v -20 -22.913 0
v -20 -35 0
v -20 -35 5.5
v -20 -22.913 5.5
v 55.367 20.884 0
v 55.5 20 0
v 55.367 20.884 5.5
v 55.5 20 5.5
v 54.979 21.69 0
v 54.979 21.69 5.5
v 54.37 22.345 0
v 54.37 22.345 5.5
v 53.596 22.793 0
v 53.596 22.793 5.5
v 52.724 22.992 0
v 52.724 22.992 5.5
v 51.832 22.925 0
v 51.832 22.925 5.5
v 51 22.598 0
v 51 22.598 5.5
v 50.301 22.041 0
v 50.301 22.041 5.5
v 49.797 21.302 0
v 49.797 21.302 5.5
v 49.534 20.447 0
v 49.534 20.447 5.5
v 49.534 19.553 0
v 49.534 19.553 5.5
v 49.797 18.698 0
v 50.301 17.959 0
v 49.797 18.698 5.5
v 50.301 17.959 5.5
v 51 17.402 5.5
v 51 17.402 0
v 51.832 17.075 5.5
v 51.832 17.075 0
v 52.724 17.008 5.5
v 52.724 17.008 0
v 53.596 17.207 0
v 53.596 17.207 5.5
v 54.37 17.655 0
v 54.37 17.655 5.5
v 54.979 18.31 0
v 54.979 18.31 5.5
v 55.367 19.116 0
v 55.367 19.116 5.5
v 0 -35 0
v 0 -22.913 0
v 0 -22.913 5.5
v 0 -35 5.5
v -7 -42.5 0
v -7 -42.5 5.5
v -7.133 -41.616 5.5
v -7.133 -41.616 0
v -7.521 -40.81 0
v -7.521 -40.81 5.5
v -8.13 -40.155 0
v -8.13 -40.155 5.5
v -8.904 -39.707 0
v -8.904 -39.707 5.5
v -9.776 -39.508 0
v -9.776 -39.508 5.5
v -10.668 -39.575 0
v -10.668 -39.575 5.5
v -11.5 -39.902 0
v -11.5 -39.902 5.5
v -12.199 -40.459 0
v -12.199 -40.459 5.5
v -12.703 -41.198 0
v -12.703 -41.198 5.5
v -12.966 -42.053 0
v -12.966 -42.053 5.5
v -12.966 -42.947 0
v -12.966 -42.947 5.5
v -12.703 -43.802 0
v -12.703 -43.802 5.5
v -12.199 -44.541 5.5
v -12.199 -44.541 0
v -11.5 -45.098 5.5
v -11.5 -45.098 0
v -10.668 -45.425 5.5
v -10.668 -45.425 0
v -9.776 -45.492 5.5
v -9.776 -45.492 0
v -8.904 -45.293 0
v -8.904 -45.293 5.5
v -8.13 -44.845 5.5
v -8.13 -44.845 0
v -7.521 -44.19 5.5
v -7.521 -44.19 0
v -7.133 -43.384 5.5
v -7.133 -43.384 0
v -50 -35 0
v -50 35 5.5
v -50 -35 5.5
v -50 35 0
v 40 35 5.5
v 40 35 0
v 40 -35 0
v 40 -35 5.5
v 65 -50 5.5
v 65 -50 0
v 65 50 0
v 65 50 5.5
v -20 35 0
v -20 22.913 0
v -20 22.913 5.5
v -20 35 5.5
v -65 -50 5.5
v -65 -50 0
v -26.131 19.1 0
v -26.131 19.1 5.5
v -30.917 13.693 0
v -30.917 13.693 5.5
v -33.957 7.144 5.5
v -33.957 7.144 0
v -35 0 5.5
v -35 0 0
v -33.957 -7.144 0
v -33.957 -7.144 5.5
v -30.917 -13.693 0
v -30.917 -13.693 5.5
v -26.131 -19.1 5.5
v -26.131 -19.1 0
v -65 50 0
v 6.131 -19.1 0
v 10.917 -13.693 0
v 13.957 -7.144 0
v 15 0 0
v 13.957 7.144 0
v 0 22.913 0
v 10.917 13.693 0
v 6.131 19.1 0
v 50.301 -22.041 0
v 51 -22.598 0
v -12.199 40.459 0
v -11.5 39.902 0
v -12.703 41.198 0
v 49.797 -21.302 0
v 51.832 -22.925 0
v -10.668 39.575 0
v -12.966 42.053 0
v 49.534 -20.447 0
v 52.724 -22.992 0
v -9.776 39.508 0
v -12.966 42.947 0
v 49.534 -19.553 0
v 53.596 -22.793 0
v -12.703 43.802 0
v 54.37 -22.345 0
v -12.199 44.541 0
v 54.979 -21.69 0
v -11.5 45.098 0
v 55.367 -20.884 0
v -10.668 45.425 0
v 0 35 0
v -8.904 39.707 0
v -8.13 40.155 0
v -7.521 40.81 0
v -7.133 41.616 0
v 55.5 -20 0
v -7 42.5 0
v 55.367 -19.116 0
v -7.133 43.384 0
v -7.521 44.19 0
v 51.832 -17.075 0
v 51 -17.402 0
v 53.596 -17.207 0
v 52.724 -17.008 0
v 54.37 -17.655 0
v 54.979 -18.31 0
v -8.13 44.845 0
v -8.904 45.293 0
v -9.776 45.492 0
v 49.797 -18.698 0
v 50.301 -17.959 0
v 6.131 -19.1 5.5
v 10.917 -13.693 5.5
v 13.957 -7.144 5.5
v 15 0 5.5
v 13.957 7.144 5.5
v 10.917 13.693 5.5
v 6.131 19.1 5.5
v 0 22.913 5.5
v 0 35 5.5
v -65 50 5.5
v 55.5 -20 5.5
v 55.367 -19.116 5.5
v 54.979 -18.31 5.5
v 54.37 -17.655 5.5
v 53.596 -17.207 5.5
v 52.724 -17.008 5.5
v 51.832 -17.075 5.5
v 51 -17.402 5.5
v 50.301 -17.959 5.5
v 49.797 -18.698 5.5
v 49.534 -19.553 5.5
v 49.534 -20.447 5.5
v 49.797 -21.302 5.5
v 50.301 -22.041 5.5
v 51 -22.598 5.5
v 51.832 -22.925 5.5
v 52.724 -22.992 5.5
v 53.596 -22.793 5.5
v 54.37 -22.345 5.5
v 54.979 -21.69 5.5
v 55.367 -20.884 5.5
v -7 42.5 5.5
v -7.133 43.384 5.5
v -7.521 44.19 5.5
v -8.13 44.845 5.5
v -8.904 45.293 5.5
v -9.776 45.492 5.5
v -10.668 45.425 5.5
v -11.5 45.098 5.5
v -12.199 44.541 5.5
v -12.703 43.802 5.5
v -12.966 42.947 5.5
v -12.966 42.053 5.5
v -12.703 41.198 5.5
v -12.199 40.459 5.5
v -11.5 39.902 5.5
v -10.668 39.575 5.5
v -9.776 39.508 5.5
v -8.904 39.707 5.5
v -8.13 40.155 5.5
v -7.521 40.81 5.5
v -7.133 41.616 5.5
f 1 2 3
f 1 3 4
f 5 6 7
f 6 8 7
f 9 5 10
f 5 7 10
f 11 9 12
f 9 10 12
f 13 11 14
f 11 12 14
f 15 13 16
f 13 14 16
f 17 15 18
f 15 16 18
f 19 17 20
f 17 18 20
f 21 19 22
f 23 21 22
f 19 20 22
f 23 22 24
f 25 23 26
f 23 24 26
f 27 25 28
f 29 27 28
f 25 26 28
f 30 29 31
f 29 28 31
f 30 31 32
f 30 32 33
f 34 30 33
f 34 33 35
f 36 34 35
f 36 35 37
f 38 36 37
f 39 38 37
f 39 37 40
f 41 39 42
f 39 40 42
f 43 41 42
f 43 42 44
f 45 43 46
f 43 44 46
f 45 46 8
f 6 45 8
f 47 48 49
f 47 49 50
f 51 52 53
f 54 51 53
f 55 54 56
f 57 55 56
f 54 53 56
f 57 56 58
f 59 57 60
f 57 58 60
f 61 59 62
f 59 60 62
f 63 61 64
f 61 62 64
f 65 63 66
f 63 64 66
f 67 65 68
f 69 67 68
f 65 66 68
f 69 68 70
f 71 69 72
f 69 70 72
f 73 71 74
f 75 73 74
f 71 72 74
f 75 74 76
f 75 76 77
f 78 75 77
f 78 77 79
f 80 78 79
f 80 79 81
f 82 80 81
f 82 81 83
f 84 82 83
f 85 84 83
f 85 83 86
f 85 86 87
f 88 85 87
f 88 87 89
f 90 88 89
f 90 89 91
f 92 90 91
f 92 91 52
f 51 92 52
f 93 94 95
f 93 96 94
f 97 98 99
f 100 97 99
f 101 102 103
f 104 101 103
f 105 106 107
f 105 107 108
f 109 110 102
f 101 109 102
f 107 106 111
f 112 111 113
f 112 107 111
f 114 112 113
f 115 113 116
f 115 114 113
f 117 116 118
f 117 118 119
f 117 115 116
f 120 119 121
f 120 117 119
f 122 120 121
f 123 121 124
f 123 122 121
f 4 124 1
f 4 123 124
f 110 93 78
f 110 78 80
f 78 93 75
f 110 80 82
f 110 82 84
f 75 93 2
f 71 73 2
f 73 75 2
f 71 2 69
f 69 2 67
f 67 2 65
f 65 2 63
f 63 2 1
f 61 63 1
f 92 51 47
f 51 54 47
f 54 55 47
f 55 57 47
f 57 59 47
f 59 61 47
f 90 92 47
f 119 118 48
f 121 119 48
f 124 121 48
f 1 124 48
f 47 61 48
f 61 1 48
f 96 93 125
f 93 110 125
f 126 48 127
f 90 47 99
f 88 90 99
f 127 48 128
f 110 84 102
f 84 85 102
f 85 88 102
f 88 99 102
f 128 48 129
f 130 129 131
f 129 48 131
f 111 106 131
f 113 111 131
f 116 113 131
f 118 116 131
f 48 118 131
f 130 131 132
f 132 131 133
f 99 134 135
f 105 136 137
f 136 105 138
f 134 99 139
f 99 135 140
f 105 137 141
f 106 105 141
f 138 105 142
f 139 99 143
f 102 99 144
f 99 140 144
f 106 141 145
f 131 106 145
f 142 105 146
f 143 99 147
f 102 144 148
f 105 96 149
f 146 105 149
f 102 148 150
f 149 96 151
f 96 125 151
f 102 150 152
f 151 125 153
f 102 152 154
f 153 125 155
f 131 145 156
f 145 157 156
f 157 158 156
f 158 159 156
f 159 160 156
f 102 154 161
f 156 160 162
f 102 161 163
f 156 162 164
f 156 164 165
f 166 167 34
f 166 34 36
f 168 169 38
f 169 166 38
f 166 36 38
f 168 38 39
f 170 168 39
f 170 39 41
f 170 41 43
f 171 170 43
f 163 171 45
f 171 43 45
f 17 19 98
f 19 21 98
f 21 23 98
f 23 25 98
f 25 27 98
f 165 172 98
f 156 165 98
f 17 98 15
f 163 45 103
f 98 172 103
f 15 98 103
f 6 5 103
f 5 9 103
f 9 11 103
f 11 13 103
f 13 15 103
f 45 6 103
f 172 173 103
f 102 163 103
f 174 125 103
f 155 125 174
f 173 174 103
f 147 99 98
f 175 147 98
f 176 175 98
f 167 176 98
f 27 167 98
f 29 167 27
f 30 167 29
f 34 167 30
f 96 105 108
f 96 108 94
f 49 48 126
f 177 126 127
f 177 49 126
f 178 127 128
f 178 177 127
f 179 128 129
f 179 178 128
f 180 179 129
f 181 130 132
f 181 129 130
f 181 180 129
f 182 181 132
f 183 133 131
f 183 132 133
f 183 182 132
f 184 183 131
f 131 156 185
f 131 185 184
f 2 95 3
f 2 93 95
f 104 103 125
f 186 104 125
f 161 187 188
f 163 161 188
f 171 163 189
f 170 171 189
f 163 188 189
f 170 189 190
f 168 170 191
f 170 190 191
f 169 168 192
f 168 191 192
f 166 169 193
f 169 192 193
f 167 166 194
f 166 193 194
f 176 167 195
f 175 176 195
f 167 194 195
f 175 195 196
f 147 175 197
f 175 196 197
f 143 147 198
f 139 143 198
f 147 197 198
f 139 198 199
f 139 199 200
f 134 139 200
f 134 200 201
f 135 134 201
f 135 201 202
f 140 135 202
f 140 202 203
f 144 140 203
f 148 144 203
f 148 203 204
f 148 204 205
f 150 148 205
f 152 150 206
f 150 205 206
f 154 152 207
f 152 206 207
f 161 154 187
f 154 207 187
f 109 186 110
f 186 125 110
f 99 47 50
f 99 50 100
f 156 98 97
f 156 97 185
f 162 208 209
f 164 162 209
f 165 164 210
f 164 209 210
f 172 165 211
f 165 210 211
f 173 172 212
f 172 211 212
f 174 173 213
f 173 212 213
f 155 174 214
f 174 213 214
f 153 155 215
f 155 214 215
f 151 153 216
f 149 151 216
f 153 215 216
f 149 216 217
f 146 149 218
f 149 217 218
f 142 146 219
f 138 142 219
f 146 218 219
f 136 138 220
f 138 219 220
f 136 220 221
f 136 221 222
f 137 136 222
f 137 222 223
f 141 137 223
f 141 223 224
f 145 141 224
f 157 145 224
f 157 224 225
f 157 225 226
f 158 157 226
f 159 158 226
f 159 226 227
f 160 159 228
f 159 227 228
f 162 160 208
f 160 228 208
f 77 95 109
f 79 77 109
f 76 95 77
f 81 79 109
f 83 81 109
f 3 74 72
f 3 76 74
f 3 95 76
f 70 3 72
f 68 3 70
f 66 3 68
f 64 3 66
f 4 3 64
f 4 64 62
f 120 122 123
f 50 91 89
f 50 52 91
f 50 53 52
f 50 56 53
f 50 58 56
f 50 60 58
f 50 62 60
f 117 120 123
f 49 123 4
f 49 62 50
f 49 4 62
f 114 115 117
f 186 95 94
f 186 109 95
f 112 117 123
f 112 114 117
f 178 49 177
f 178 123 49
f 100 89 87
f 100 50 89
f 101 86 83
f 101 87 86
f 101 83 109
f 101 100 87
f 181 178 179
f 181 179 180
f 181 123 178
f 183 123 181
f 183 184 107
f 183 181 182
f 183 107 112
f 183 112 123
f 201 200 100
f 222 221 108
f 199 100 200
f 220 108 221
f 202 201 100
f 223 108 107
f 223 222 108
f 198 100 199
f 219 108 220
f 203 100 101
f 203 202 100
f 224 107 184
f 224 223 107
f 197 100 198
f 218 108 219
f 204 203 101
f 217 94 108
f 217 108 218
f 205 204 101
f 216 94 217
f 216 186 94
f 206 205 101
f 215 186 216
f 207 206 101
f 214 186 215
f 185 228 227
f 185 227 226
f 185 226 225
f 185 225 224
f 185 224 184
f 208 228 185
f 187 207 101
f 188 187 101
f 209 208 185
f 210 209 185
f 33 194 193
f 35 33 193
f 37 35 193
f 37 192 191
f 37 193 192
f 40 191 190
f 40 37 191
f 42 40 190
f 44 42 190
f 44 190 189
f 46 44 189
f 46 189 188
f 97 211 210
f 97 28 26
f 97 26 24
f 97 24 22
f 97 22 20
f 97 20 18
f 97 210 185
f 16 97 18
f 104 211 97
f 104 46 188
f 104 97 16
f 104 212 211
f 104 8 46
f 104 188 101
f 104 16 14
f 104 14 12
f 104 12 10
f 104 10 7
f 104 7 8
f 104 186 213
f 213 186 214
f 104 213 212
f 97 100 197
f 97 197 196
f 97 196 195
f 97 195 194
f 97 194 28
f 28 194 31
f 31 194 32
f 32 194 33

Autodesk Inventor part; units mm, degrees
ref_plane "YZ Plane" through (0, 0, 0) normal (1, 0, 0) x (0, 1, 0)
ref_plane "XZ Plane" through (0, 0, 0) normal (0, 1, 0) x (-1, 0, 0)
ref_plane "XY Plane" through (0, 0, 0) normal (0, 0, 1) x (1, 0, 0)
sketch "Boceto1" plane through (0, 0, 0) normal (0, 0, 1) x (1, 0, 0)
  line L0 (-65, -50) -> (65, -50)
  line L1 (65, -50) -> (65, 50)
  line L2 (65, 50) -> (-65, 50)
  line L3 (-65, 50) -> (-65, -50)
  line L4 (-65, -50) -> (65, 50) construction
  line L5 (65, -50) -> (-65, 50) construction
  line L6 (-50, -35) -> (50, -35)
  line L7 (50, -35) -> (50, 35)
  line L8 (50, 35) -> (-50, 35)
  line L9 (-50, 35) -> (-50, -35)
  line L10 (-50, -35) -> (50, 35) construction
  line L11 (50, -35) -> (-50, 35) construction
  point P0 (0, 0)
  dimension "d0" = 130
  dimension "d1" = 100
  dimension "d2" = 100
  dimension "d3" = 70
extrude "Extrusión1" add sketch "Boceto1" along normal blind 5.5
sketch "Boceto2" plane through (0, 0, 0) normal (0, 0, 1) x (1, 0, 0)
  line L0 (0, 0) -> (-20, 0)
  line L1 (-20, 0) -> (-20, 35)
  line L2 (-50, 35) -> (50, 35) projected
  line L3 (-20, 0) -> (0, 0)
  line L4 (0, 0) -> (0, 35)
  line L5 (0, 35) -> (-20, 35)
  line L6 (-20, 35) -> (-20, 0)
  line L7 (50, -35) -> (-50, -35) projected
  line L8 (-20, 0) -> (0, 0)
  line L9 (0, 0) -> (0, -35)
  line L10 (0, -35) -> (-20, -35)
  line L11 (-20, -35) -> (-20, 0)
  line L12 (50, 35) -> (40, 35)
  line L13 (40, 35) -> (40, -35)
  line L14 (50, 35) -> (50, -35) projected
  line L15 (50, -35) -> (50, 35)
  line L16 (50, -35) -> (40, -35)
  dimension "d6" = 20
  dimension "d7" = 10
extrude "Extrusión9" add sketch "Boceto2" along normal blind 5.5 contours L9 L7 L11 L0 | L0 L1 L2 L4 | L2 L14 L7 L13
sketch "Boceto8" plane through (0, 0, 5.5) normal (0, 0, 1) x (1, 0, 0)
  line L0 (0, 0) -> (-20, 0)
  line L1 (-20, 35) -> (-20, -35) projected
  line L2 (-10, 0) -> (-10, 50)
  line L3 (65, 50) -> (-65, 50) projected
  line L4 (0, 35) -> (-10, 35)
  line L5 (-10, 35) -> (-10, 50)
  line L6 (-10, 50) -> (-10, 42.5)
  line L7 (-10, 0) -> (65, 0)
  line L8 (65, -50) -> (65, 50) projected
  line L9 (40, 35) -> (40, -35) projected
  line L10 (40, 0) -> (65, 0)
  line L11 (52.5, 0) -> (52.5, 20)
  circle A0 centre (-10, 42.5) radius 3
  circle A1 centre (52.5, 20) radius 3
  circle A2 centre (-10, -42.5) radius 3
  circle A3 centre (52.5, -20) radius 3
  dimension "d32" = 20
  dimension "d33" = 6
  dimension "d34" = 6
extrude "Extrusión10" cut sketch "Boceto8" against normal blind 5.5 contours A1 | A0 L2 | L2 A0 | A2 | A3
sketch "Boceto9" plane through (0, 0, 5.5) normal (0, 0, 1) x (1, 0, 0)
  line L0 (-20, 35) -> (-20, -35) projected
  line L1 (-20, 0) -> (0, 0)
  circle A0 centre (-10, 0) radius 25
  dimension "d40" = 50
extrude "Extrusión12" add sketch "Boceto9" against normal blind 5.5
properties part number "BASE"
